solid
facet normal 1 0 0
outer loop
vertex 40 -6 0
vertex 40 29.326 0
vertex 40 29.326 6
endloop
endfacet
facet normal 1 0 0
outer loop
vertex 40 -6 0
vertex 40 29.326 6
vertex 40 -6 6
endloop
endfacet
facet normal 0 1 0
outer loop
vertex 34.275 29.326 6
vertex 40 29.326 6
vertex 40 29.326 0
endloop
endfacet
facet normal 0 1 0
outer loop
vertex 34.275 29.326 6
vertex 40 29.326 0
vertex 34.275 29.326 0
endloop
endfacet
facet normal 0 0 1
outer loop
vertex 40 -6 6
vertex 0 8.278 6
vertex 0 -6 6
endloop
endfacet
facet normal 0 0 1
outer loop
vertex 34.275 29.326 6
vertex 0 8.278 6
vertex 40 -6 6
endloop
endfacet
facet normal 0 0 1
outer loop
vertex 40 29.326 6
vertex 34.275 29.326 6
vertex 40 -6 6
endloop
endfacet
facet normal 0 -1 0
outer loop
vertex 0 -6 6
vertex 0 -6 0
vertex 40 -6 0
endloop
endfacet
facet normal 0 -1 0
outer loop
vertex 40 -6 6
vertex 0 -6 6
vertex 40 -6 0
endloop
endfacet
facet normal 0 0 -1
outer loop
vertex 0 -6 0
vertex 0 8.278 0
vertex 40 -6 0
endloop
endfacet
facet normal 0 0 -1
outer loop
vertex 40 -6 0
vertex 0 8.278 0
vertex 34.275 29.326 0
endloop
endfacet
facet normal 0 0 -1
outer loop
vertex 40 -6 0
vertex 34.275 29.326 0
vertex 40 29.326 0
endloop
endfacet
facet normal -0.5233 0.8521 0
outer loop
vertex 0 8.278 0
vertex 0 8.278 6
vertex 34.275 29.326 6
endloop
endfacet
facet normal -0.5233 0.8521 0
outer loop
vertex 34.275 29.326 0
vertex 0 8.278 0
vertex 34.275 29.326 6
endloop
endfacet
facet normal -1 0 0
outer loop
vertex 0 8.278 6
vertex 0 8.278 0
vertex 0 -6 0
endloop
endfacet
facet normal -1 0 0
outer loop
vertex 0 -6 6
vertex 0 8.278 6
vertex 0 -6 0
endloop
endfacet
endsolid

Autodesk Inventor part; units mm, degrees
ref_plane "YZ Plane" through (0, 0, 0) normal (1, 0, 0) x (0, 1, 0)
ref_plane "XZ Plane" through (0, 0, 0) normal (0, 1, 0) x (-1, 0, 0)
ref_plane "XY Plane" through (0, 0, 0) normal (0, 0, 1) x (1, 0, 0)
sketch "Эскиз1" plane through (0, 0, 0) normal (0, 0, 1) x (1, 0, 0)
  line L0 (40, 0) -> (0, 0) projected
  line L1 (40, 0) -> (40, -6) projected
  line L2 (0, -6) -> (40, -6) projected
  line L3 (0, 0) -> (0, -6) projected
  line L4 (0, 0) -> (0, 20)
  line L5 (0, 20) -> (18.33, 29.326)
  line L6 (40, 0) -> (40, 29.326)
  line L7 (40, 29.326) -> (18.33, 29.326)
  dimension "d0" = 20
extrude "Выдавливание1" add sketch "Эскиз1" along normal blind 6
sketch "Эскиз2" plane through (0, 0, 6) normal (0, 0, 1) x (1, 0, 0)
  line L0 (0, 20) -> (0, -6) projected
  line L1 (40, 29.326) -> (18.33, 29.326) projected
  line L2 (18.33, 29.326) -> (0, 20)
  line L3 (18.33, 29.326) -> (0, 20) projected
  line L4 (0, 8.2778) -> (18.33, 29.326)
  point P0 (0, 0)
extrude "Выдавливание2" cut sketch "Эскиз2" against normal blind 6
sketch "Эскиз3" plane through (0, 0, 6) normal (0, 0, 1) x (1, 0, 0)
  line L0 (0, 8.2778) -> (0, -6) projected
  line L1 (0, 8.2778) -> (34.2751, 29.326)
  line L2 (40, 29.326) -> (18.33, 29.326) projected
  line L3 (0, 8.2778) -> (18.33, 29.326)
  line L4 (18.33, 29.326) -> (34.2751, 29.326)
  point P0 (0, 0)
extrude "Выдавливание3" cut sketch "Эскиз3" against normal blind 6
sketch "Эскиз4" plane through (0, 0, 0) normal (0, 0, -1) x (-1, 0, 0)
  point P0 (0, 0)
sketch "Эскиз5" plane through (0, 0, 0) normal (0, 0, -1) x (-1, 0, 0)
  line L0 (4.9019, -6) -> (-15.0981, -6) projected
  line L1 (0, -6) -> (-40, -6) projected
  point P0 (0, 0)
properties part number "Лепесток"
